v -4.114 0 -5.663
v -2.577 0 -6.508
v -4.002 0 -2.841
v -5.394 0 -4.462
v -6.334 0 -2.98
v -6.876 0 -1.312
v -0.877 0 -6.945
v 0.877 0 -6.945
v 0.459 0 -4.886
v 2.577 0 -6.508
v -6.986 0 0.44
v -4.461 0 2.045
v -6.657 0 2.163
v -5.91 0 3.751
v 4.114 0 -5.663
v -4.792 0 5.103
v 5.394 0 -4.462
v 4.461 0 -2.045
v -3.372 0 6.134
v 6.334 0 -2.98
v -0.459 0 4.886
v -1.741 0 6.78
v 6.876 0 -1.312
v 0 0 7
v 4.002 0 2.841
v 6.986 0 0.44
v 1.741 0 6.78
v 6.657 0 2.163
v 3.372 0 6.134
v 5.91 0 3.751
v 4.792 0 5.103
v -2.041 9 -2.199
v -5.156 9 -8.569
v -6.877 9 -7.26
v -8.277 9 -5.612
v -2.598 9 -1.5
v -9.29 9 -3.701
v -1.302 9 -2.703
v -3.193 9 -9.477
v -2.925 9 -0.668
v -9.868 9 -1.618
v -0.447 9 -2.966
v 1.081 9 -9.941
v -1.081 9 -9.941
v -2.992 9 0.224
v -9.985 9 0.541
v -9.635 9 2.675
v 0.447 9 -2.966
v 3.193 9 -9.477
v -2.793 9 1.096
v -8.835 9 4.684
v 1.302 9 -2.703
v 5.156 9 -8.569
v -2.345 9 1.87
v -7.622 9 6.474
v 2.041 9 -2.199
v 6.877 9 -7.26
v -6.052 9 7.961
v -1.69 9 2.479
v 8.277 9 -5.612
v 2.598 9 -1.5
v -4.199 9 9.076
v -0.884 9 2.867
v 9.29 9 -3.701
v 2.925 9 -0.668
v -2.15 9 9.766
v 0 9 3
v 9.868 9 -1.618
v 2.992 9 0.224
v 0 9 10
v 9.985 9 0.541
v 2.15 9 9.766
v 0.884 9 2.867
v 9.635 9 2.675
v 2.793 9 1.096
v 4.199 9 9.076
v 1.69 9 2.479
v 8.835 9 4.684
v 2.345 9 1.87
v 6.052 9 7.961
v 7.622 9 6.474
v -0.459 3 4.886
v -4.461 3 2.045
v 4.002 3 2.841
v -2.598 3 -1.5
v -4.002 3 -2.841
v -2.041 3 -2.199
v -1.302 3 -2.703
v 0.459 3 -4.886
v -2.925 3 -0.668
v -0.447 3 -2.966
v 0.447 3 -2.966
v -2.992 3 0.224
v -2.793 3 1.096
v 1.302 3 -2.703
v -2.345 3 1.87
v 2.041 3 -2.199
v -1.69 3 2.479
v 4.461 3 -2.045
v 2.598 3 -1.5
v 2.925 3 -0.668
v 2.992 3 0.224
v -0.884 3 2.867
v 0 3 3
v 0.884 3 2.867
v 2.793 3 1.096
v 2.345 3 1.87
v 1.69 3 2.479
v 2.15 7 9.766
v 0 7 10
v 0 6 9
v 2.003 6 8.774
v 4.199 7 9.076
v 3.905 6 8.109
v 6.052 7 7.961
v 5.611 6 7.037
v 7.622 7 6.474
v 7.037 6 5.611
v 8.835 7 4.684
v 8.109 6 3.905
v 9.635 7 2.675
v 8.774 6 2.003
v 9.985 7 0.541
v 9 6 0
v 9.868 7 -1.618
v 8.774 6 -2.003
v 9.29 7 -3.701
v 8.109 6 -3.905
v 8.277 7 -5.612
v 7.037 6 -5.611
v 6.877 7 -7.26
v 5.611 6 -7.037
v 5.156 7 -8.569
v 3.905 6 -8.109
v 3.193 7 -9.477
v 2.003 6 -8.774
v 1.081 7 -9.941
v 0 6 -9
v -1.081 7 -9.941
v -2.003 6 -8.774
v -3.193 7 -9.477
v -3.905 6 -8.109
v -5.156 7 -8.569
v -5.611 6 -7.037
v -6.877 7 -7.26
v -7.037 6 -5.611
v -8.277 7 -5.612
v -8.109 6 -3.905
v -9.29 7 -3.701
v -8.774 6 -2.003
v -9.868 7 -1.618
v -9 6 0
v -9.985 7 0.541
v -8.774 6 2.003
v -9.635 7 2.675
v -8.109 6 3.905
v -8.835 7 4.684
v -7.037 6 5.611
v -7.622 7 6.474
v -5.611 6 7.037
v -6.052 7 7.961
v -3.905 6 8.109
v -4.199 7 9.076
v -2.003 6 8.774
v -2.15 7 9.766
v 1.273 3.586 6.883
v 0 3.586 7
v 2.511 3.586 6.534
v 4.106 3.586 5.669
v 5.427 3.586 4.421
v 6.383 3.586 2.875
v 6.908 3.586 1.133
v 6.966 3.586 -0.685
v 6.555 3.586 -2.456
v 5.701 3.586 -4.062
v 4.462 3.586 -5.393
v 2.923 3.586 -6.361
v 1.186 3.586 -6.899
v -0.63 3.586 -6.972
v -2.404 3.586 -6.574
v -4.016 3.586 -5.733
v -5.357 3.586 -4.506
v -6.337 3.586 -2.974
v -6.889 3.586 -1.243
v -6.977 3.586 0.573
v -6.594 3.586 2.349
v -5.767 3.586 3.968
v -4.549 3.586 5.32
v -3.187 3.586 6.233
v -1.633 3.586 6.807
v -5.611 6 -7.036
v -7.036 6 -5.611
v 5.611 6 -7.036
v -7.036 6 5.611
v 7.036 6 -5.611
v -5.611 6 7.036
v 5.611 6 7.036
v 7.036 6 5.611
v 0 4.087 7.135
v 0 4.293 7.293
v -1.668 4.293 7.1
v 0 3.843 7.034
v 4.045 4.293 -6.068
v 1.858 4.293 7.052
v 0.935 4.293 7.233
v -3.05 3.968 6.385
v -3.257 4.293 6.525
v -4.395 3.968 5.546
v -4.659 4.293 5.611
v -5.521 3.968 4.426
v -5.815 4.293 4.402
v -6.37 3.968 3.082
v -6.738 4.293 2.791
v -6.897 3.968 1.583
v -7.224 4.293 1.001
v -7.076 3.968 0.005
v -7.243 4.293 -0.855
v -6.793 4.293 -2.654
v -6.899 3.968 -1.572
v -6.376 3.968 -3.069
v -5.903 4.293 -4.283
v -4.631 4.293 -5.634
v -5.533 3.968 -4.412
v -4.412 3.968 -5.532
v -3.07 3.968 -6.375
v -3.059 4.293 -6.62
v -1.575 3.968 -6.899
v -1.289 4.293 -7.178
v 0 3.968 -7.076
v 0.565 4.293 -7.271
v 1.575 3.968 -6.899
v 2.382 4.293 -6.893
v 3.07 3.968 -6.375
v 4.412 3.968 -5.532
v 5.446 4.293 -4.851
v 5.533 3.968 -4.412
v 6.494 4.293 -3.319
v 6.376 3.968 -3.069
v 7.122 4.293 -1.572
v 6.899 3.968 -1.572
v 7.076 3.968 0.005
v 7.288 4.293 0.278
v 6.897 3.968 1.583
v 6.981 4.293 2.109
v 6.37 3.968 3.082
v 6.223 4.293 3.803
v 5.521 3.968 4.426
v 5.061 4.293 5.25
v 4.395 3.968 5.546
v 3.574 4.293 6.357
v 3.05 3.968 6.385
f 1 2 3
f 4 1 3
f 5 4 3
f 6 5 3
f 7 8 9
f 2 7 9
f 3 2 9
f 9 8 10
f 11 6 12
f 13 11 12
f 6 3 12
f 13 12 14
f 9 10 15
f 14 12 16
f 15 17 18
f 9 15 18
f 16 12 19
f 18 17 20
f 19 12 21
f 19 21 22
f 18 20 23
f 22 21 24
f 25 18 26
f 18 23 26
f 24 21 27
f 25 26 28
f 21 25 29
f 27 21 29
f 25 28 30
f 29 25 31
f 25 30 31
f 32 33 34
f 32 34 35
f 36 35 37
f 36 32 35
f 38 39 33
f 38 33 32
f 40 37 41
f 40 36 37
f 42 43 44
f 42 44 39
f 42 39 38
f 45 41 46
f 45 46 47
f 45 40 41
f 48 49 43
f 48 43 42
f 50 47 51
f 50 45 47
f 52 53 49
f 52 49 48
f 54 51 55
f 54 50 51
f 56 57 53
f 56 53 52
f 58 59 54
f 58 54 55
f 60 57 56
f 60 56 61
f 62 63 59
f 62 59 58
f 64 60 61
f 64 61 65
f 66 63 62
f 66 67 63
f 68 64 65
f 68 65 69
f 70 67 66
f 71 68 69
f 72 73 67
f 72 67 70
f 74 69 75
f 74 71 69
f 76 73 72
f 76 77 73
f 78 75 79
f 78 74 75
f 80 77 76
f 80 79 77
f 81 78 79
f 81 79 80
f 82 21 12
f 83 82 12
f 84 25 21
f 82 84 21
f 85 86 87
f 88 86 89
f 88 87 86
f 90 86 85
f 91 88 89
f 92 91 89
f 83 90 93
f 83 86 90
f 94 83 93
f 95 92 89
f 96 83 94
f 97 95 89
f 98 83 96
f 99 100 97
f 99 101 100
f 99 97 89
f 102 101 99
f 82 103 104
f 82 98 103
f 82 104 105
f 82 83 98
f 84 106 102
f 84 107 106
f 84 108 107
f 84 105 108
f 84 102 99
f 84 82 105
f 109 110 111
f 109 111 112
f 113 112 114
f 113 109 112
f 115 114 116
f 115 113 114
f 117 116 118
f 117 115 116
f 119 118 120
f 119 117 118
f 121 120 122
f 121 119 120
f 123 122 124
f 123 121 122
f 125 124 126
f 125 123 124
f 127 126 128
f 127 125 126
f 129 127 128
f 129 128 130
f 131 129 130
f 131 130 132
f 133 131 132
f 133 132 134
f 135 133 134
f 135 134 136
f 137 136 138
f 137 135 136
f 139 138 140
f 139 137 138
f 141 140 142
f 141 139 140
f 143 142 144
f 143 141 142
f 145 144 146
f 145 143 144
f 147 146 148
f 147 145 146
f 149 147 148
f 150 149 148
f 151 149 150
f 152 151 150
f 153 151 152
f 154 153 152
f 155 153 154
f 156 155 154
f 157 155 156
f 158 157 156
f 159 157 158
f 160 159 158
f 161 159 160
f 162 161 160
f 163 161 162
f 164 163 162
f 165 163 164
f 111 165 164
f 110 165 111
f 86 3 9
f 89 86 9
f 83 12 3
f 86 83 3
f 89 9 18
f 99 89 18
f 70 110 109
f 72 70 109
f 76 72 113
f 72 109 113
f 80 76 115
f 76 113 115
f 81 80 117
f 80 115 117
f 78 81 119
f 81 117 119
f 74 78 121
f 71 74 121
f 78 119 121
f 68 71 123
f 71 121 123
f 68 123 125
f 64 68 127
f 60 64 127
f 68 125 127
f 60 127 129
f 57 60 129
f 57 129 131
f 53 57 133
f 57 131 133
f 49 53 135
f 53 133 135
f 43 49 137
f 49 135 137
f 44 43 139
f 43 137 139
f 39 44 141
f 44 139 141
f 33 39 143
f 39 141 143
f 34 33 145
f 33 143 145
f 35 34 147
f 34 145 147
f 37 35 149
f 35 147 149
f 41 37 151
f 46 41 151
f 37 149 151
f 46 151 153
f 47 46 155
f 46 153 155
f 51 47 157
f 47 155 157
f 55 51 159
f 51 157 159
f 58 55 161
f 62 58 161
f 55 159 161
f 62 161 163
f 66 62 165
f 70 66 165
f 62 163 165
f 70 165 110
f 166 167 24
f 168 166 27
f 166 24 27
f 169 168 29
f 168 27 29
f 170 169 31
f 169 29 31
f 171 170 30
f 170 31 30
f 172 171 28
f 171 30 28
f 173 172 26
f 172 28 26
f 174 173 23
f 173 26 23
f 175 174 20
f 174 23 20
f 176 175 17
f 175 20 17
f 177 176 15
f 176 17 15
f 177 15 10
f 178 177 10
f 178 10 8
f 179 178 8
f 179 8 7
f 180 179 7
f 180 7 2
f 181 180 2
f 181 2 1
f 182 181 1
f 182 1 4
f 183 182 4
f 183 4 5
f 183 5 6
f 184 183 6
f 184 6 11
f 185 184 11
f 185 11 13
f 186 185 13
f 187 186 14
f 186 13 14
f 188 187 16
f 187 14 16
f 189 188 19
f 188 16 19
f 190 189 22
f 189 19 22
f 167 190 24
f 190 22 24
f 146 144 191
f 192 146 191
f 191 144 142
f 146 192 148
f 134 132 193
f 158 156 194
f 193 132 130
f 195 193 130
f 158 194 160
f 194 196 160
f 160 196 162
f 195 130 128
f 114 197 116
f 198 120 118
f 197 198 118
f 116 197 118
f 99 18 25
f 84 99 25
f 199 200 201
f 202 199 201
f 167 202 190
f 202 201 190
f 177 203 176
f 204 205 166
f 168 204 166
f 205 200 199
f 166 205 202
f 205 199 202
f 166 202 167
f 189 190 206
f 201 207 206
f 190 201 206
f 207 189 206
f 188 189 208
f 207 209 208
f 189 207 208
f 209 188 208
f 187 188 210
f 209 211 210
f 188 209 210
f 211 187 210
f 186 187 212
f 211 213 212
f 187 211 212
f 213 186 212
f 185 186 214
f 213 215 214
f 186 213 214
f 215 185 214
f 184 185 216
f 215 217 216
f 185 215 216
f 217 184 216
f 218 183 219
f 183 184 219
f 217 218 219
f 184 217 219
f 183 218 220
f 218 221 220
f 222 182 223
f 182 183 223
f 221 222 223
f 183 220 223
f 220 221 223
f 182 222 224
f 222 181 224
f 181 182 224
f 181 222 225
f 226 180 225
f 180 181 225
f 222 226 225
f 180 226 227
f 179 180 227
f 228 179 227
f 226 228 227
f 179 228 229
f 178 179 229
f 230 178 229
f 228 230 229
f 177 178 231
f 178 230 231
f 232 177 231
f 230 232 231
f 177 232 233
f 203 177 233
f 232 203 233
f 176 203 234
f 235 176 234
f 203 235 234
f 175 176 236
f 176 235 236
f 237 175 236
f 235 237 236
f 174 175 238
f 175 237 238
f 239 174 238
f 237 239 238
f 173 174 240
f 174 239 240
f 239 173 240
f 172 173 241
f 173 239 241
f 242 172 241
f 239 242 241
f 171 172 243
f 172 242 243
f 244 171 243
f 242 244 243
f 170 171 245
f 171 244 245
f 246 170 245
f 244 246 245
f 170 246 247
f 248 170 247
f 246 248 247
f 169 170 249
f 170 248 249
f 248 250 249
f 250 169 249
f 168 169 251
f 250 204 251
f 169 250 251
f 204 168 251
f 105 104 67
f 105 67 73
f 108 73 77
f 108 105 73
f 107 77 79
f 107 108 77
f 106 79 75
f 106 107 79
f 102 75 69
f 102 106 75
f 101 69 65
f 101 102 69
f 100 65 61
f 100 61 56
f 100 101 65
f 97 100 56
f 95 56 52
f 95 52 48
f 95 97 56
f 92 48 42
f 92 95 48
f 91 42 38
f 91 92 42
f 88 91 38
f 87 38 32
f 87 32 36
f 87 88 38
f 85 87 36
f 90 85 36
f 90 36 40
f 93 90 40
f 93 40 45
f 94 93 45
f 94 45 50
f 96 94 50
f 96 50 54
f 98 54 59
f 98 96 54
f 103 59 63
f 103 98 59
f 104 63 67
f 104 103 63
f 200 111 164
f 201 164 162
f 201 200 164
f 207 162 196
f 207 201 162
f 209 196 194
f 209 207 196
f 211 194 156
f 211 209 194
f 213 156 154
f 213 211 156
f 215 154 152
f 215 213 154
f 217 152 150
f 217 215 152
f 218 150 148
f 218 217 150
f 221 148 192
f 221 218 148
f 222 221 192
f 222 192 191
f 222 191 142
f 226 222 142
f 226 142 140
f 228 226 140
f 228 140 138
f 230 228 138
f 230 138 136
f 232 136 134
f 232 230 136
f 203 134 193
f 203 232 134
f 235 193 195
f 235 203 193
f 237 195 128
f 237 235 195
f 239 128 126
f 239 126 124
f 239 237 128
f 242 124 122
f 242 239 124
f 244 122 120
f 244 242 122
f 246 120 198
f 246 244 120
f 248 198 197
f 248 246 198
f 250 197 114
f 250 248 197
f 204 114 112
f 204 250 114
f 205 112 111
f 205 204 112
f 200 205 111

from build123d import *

# Parameters (mm, degrees)
SKETCH1_R           = 7
SKETCH1_R_2         = 3
BOSS_EXTRUDE1_DEPTH = 9
BOSS_EXTRUDE2_START = -3
SKETCH2_R           = 10
SKETCH2_R_2         = 3
BOSS_EXTRUDE2_DEPTH = 3
CUT_EXTRUDE1_DEPTH  = 3
CHAMFER1_SIZE       = 2
CHAMFER2_SIZE       = 1
FILLET1_R           = 1


with BuildPart() as part:
    # Sketch1 → Boss-Extrude1 (new body)
    with BuildSketch(Plane(origin=(0, 0, 0), x_dir=(1, 0, 0), z_dir=(0, 1, 0))):
        with Locations(Location((0, 0, 0), (0, 0, 270))):
            Circle(SKETCH1_R)
        with Locations(Location((0, 0, 0), (0, 0, 270))):
            Circle(SKETCH1_R_2, mode=Mode.SUBTRACT)
    extrude(amount=BOSS_EXTRUDE1_DEPTH)

    # Sketch2 → Boss-Extrude2 (add)
    with BuildSketch(Plane(origin=(0, 9, 0), x_dir=(1, 0, 0), z_dir=(0, 1, 0)).offset(BOSS_EXTRUDE2_START)):
        with Locations(Location((0, 0, 0), (0, 0, 270))):
            Circle(SKETCH2_R)
        with Locations(Location((0, 0, 0), (0, 0, 270))):
            Circle(SKETCH2_R_2, mode=Mode.SUBTRACT)
    extrude(amount=BOSS_EXTRUDE2_DEPTH)

    # Sketch3 → Cut-Extrude1 (cut)
    with BuildSketch(Plane.XZ):
        Polygon((-4.001709946, -2.840713087), (0.459274725, -4.885939015), (4.460984671, -2.045225929), (4.001709946, 2.840713087), (-0.459274725, 4.885939015), (-4.460984671, 2.045225929), align=None)
    extrude(amount=-CUT_EXTRUDE1_DEPTH, mode=Mode.SUBTRACT)

    # Chamfer1
    chamfer1_edges = [part.edges().sort_by_distance(p)[0] for p in [
        (0, 6, -7),
    ]]
    chamfer(chamfer1_edges, length=CHAMFER1_SIZE)

    # Chamfer2
    chamfer2_edges = [part.edges().sort_by_distance(p)[0] for p in [
        (0, 6, -10),
    ]]
    chamfer(chamfer2_edges, length=CHAMFER2_SIZE - 0.0001)  # a hair under: the kernel refuses the full size

    # Fillet1
    fillet1_edges = [part.edges().sort_by_distance(p)[0] for p in [
        (0, 4, -7),
    ]]
    fillet(fillet1_edges, radius=FILLET1_R)


solid = part.part
